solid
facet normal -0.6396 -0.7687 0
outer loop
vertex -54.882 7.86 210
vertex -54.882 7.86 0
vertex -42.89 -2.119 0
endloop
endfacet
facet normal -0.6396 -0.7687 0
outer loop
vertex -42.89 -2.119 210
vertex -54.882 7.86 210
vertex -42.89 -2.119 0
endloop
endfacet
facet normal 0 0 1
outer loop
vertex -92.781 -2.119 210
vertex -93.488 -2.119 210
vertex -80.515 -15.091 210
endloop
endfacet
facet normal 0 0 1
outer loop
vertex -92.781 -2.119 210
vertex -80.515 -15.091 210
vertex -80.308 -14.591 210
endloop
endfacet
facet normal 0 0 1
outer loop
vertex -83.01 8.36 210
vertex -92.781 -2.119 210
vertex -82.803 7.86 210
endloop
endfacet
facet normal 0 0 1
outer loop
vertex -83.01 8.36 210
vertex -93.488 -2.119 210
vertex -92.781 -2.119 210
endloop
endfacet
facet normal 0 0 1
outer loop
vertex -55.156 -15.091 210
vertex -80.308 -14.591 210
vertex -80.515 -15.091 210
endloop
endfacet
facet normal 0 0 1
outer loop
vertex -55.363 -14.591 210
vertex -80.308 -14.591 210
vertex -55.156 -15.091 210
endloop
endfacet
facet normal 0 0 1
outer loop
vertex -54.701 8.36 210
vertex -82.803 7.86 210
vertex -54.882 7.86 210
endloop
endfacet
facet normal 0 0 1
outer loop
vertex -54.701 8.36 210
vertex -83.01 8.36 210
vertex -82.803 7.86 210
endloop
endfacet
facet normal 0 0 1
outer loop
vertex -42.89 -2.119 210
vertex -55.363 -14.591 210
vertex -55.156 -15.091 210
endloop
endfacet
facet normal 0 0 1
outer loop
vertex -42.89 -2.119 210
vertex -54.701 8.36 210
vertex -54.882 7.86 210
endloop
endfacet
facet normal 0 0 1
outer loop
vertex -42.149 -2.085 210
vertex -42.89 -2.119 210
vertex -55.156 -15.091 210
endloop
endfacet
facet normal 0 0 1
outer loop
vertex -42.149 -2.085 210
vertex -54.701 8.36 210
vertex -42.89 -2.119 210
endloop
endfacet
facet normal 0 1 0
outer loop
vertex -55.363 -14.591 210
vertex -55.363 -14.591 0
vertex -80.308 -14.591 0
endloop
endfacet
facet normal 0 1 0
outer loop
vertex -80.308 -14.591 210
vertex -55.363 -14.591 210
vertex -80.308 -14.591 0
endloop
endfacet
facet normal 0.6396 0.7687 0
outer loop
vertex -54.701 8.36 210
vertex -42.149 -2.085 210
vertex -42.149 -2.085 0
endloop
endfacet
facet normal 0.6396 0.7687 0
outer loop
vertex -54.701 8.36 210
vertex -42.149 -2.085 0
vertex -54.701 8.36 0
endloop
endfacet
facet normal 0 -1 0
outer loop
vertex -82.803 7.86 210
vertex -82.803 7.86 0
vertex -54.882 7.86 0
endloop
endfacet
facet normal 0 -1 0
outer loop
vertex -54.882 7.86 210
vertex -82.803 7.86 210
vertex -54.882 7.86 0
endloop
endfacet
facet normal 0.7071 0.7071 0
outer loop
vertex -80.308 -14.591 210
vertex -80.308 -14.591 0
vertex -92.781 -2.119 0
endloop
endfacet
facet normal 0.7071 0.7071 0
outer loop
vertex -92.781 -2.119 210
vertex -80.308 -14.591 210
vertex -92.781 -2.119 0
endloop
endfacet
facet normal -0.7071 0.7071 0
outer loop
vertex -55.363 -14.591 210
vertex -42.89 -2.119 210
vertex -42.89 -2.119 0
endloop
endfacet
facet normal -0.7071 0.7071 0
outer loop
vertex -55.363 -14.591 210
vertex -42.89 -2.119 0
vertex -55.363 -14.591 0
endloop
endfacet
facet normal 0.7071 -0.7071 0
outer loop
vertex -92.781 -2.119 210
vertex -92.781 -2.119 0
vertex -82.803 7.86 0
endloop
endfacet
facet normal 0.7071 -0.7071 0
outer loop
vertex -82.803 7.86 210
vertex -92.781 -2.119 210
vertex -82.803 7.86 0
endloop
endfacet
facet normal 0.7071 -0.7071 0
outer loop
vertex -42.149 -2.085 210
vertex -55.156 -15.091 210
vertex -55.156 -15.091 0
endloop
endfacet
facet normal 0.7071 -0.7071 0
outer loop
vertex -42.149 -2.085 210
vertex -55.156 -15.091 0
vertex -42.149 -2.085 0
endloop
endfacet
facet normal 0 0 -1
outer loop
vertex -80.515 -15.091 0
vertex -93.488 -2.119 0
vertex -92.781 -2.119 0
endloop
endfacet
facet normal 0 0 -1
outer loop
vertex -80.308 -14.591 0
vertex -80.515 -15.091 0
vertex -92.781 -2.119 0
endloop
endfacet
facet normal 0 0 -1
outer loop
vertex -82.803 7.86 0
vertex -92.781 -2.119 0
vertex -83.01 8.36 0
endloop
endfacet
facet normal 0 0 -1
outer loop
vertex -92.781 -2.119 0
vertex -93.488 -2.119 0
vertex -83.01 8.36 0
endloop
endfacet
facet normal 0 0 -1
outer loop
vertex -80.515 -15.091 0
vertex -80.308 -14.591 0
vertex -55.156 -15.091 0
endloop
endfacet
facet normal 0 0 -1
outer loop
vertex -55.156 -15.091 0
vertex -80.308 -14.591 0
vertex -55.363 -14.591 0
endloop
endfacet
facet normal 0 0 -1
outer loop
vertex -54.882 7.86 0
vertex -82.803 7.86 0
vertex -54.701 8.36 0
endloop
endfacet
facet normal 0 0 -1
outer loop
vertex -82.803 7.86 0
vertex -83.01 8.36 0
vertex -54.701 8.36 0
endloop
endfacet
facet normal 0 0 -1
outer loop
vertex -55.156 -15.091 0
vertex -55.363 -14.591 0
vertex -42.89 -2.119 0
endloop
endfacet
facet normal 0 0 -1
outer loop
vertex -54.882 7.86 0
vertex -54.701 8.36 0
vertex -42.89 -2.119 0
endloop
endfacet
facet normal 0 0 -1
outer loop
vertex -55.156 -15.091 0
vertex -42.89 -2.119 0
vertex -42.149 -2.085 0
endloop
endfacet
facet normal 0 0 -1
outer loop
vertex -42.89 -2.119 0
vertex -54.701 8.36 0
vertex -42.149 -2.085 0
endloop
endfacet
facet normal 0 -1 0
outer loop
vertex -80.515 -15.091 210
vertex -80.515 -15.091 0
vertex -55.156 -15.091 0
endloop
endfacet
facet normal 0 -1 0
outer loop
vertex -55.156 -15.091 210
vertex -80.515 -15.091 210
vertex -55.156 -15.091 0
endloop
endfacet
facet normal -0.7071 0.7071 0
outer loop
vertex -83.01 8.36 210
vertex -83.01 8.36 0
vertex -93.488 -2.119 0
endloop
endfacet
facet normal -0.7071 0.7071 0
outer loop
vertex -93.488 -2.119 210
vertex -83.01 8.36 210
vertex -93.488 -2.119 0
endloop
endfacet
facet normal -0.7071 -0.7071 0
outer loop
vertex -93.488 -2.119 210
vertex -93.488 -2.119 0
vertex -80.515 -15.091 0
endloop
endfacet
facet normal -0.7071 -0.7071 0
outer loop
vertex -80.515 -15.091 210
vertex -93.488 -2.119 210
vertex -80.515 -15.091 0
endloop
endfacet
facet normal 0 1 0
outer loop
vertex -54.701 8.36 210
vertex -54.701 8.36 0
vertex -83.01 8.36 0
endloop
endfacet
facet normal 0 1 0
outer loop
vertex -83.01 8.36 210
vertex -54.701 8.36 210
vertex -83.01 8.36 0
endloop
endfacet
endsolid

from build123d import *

# Parameters (mm, degrees)
F1_DEPTH = 210


with BuildPart() as f1:
    # F0 (on Top) → F1 (new body)
    with BuildSketch(Plane.XY):
        Polygon((-54.881843, 7.859512), (-42.890312, -2.118638), (-55.363, -14.591326), (-55.861931, -15.091326), (-55.155894, -15.091326), (-42.149323, -2.084756), (-54.701024, 8.359512), (-83.010021, 8.359512), (-93.488171, -2.118638), (-80.515483, -15.091326), (-79.807307, -15.091326), (-80.308376, -14.591326), (-92.781064, -2.118638), (-82.802914, 7.859512), align=None)
        Polygon((-55.861931, -15.091326), (-55.363, -14.591326), (-80.308376, -14.591326), (-79.807307, -15.091326), align=None)
    extrude(amount=F1_DEPTH)


solid = f1.part
